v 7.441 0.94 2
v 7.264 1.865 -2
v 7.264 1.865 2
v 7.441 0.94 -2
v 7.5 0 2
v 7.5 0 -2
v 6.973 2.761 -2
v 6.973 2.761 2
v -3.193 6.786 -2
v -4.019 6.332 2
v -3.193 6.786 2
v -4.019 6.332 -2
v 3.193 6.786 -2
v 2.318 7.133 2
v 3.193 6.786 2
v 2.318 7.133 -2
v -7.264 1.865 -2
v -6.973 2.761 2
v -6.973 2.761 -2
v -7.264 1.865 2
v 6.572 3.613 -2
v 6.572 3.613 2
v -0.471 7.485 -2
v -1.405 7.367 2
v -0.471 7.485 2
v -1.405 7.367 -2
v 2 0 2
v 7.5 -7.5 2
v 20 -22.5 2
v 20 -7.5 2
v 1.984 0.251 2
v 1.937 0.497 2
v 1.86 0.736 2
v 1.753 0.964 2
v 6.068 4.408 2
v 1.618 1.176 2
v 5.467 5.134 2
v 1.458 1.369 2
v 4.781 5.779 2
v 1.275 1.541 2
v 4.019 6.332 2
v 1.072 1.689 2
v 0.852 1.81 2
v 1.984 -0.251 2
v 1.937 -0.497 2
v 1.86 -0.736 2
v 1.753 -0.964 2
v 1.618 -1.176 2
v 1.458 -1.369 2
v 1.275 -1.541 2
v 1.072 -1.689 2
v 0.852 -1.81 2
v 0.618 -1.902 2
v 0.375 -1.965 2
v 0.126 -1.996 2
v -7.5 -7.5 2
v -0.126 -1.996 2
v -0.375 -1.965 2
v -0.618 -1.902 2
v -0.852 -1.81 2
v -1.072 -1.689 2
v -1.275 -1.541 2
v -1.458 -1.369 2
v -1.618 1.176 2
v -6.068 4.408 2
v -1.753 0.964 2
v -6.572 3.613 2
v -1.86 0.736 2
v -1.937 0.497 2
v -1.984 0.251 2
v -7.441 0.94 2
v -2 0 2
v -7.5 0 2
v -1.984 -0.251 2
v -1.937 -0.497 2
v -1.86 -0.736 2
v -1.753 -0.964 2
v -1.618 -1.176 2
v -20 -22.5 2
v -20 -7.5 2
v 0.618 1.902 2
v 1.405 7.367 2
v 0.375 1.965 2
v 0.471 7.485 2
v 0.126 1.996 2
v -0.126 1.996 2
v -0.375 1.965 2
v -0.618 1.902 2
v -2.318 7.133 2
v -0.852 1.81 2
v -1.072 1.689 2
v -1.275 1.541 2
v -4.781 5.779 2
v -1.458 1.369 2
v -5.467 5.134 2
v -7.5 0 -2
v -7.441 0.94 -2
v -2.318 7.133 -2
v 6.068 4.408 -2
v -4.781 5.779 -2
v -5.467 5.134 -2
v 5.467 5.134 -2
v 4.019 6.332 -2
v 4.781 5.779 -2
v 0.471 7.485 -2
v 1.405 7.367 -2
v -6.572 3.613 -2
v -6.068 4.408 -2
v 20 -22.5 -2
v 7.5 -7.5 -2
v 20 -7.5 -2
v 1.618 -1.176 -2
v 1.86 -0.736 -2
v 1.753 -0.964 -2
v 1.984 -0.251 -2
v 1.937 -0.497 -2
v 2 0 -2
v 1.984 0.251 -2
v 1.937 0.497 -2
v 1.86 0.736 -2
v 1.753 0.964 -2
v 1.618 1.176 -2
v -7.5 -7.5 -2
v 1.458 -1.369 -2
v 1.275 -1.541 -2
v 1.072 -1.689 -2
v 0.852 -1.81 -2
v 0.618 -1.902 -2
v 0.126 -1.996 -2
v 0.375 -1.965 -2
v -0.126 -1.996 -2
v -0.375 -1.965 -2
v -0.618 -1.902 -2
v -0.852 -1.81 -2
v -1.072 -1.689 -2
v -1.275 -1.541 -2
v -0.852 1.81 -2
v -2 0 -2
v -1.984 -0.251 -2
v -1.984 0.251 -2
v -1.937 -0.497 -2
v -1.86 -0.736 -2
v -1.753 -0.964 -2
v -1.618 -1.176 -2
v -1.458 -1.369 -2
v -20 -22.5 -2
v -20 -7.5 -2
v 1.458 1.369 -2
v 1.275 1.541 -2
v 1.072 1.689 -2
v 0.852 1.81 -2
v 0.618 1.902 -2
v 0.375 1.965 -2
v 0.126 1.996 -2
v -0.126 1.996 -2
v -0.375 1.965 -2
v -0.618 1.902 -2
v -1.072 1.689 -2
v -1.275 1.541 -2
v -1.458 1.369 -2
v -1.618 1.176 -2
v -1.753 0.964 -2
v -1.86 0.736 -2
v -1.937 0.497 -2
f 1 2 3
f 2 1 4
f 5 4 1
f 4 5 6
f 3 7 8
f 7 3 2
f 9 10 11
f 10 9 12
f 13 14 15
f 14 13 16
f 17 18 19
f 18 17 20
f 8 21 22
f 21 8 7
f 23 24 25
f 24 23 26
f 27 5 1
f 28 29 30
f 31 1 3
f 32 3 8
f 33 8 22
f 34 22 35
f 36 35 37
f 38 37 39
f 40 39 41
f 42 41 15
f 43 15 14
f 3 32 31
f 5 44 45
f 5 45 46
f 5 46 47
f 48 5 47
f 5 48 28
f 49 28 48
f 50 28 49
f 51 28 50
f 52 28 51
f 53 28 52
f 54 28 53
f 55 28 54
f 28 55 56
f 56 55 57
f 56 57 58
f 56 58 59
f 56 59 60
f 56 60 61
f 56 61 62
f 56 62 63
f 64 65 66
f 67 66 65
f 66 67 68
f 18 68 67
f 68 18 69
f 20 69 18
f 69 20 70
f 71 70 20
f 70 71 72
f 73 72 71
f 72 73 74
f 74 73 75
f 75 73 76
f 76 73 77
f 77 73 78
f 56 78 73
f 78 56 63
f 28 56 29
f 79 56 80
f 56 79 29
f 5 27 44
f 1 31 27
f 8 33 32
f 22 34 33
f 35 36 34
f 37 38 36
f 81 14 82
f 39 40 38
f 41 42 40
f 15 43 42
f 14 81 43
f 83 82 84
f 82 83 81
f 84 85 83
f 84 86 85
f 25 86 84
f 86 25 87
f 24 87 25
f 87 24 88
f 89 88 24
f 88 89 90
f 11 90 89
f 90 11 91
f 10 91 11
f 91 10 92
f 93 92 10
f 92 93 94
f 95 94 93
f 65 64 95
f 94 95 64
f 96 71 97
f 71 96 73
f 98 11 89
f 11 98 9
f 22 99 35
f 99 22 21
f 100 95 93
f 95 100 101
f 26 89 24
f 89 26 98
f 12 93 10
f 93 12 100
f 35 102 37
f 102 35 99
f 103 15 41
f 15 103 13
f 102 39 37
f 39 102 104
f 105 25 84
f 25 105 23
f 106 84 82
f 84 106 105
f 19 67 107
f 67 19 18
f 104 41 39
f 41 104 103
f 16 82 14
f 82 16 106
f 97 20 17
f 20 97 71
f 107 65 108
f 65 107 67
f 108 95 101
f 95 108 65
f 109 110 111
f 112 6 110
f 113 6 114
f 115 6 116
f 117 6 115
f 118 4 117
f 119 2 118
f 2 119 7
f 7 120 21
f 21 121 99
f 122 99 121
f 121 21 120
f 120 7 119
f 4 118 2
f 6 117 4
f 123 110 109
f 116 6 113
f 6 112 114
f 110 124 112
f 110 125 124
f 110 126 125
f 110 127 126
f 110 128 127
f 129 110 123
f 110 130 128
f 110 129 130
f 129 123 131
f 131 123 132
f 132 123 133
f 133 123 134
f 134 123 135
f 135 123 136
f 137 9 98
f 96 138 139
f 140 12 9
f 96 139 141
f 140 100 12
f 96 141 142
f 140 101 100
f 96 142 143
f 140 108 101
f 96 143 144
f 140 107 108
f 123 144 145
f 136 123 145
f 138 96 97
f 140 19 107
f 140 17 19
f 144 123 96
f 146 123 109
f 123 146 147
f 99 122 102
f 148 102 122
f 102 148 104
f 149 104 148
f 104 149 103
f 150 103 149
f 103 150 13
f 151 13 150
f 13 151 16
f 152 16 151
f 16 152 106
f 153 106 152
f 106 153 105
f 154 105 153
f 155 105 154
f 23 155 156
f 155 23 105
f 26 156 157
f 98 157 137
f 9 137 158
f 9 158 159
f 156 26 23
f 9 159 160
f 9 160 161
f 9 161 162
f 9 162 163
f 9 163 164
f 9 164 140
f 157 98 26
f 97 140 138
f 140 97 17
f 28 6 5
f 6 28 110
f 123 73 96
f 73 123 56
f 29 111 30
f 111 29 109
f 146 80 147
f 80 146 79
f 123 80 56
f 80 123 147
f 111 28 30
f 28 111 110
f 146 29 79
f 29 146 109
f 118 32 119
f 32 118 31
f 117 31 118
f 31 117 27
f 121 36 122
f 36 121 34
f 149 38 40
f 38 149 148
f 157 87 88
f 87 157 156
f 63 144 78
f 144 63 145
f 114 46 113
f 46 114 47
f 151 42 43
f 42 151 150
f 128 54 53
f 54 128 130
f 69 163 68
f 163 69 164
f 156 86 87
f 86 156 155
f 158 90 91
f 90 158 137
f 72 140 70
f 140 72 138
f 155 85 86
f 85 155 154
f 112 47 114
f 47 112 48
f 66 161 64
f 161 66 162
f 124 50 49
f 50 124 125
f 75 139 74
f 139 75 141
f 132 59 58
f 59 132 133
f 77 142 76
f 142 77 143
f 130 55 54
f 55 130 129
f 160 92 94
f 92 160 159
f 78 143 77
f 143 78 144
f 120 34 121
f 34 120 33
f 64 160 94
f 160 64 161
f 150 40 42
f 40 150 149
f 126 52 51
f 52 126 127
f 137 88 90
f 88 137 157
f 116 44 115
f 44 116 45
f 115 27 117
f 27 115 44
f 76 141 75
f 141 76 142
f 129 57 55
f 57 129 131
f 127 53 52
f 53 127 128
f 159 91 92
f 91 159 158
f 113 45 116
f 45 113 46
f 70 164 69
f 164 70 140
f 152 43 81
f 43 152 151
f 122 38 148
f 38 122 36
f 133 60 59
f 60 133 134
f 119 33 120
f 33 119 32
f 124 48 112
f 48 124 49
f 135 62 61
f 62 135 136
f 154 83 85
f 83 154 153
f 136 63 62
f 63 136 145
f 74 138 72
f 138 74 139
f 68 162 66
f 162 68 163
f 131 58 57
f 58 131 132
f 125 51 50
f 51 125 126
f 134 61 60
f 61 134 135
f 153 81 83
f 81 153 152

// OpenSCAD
// [FL_INDEX: keywords="openscad, 3d_parametric, Tool_Rack_Tabs, csg_solid" | COT="Parametric OpenSCAD design from 3DCodeverse"]
// Title: Tool Rack Tabs

// Tab thickness
tab_thickness = 4;

// Width of the sticky-uppy-bit
tab_width = 15;

// Width of the bit that bears the weight
tab_shoulder = 40;

// Screw hold diameter
screw_diameter = 4;

/* [Hidden] */
tab_radius = tab_width / 2;
screw_radius = screw_diameter / 2;

$fn = 50;

module tab() {
  difference() {
    union() {
      cylinder(h = tab_thickness, r = tab_radius, center = true);
      translate([0, -tab_radius, 0]) {
        cube([tab_width, tab_width, tab_thickness], center = true);
      }
      translate([0, -tab_width, 0]) {
        cube([tab_shoulder, tab_width, tab_thickness], center = true);
      }
    }
    cylinder(h = tab_thickness + 1, r = screw_radius, center = true);
  }
}

tab();
